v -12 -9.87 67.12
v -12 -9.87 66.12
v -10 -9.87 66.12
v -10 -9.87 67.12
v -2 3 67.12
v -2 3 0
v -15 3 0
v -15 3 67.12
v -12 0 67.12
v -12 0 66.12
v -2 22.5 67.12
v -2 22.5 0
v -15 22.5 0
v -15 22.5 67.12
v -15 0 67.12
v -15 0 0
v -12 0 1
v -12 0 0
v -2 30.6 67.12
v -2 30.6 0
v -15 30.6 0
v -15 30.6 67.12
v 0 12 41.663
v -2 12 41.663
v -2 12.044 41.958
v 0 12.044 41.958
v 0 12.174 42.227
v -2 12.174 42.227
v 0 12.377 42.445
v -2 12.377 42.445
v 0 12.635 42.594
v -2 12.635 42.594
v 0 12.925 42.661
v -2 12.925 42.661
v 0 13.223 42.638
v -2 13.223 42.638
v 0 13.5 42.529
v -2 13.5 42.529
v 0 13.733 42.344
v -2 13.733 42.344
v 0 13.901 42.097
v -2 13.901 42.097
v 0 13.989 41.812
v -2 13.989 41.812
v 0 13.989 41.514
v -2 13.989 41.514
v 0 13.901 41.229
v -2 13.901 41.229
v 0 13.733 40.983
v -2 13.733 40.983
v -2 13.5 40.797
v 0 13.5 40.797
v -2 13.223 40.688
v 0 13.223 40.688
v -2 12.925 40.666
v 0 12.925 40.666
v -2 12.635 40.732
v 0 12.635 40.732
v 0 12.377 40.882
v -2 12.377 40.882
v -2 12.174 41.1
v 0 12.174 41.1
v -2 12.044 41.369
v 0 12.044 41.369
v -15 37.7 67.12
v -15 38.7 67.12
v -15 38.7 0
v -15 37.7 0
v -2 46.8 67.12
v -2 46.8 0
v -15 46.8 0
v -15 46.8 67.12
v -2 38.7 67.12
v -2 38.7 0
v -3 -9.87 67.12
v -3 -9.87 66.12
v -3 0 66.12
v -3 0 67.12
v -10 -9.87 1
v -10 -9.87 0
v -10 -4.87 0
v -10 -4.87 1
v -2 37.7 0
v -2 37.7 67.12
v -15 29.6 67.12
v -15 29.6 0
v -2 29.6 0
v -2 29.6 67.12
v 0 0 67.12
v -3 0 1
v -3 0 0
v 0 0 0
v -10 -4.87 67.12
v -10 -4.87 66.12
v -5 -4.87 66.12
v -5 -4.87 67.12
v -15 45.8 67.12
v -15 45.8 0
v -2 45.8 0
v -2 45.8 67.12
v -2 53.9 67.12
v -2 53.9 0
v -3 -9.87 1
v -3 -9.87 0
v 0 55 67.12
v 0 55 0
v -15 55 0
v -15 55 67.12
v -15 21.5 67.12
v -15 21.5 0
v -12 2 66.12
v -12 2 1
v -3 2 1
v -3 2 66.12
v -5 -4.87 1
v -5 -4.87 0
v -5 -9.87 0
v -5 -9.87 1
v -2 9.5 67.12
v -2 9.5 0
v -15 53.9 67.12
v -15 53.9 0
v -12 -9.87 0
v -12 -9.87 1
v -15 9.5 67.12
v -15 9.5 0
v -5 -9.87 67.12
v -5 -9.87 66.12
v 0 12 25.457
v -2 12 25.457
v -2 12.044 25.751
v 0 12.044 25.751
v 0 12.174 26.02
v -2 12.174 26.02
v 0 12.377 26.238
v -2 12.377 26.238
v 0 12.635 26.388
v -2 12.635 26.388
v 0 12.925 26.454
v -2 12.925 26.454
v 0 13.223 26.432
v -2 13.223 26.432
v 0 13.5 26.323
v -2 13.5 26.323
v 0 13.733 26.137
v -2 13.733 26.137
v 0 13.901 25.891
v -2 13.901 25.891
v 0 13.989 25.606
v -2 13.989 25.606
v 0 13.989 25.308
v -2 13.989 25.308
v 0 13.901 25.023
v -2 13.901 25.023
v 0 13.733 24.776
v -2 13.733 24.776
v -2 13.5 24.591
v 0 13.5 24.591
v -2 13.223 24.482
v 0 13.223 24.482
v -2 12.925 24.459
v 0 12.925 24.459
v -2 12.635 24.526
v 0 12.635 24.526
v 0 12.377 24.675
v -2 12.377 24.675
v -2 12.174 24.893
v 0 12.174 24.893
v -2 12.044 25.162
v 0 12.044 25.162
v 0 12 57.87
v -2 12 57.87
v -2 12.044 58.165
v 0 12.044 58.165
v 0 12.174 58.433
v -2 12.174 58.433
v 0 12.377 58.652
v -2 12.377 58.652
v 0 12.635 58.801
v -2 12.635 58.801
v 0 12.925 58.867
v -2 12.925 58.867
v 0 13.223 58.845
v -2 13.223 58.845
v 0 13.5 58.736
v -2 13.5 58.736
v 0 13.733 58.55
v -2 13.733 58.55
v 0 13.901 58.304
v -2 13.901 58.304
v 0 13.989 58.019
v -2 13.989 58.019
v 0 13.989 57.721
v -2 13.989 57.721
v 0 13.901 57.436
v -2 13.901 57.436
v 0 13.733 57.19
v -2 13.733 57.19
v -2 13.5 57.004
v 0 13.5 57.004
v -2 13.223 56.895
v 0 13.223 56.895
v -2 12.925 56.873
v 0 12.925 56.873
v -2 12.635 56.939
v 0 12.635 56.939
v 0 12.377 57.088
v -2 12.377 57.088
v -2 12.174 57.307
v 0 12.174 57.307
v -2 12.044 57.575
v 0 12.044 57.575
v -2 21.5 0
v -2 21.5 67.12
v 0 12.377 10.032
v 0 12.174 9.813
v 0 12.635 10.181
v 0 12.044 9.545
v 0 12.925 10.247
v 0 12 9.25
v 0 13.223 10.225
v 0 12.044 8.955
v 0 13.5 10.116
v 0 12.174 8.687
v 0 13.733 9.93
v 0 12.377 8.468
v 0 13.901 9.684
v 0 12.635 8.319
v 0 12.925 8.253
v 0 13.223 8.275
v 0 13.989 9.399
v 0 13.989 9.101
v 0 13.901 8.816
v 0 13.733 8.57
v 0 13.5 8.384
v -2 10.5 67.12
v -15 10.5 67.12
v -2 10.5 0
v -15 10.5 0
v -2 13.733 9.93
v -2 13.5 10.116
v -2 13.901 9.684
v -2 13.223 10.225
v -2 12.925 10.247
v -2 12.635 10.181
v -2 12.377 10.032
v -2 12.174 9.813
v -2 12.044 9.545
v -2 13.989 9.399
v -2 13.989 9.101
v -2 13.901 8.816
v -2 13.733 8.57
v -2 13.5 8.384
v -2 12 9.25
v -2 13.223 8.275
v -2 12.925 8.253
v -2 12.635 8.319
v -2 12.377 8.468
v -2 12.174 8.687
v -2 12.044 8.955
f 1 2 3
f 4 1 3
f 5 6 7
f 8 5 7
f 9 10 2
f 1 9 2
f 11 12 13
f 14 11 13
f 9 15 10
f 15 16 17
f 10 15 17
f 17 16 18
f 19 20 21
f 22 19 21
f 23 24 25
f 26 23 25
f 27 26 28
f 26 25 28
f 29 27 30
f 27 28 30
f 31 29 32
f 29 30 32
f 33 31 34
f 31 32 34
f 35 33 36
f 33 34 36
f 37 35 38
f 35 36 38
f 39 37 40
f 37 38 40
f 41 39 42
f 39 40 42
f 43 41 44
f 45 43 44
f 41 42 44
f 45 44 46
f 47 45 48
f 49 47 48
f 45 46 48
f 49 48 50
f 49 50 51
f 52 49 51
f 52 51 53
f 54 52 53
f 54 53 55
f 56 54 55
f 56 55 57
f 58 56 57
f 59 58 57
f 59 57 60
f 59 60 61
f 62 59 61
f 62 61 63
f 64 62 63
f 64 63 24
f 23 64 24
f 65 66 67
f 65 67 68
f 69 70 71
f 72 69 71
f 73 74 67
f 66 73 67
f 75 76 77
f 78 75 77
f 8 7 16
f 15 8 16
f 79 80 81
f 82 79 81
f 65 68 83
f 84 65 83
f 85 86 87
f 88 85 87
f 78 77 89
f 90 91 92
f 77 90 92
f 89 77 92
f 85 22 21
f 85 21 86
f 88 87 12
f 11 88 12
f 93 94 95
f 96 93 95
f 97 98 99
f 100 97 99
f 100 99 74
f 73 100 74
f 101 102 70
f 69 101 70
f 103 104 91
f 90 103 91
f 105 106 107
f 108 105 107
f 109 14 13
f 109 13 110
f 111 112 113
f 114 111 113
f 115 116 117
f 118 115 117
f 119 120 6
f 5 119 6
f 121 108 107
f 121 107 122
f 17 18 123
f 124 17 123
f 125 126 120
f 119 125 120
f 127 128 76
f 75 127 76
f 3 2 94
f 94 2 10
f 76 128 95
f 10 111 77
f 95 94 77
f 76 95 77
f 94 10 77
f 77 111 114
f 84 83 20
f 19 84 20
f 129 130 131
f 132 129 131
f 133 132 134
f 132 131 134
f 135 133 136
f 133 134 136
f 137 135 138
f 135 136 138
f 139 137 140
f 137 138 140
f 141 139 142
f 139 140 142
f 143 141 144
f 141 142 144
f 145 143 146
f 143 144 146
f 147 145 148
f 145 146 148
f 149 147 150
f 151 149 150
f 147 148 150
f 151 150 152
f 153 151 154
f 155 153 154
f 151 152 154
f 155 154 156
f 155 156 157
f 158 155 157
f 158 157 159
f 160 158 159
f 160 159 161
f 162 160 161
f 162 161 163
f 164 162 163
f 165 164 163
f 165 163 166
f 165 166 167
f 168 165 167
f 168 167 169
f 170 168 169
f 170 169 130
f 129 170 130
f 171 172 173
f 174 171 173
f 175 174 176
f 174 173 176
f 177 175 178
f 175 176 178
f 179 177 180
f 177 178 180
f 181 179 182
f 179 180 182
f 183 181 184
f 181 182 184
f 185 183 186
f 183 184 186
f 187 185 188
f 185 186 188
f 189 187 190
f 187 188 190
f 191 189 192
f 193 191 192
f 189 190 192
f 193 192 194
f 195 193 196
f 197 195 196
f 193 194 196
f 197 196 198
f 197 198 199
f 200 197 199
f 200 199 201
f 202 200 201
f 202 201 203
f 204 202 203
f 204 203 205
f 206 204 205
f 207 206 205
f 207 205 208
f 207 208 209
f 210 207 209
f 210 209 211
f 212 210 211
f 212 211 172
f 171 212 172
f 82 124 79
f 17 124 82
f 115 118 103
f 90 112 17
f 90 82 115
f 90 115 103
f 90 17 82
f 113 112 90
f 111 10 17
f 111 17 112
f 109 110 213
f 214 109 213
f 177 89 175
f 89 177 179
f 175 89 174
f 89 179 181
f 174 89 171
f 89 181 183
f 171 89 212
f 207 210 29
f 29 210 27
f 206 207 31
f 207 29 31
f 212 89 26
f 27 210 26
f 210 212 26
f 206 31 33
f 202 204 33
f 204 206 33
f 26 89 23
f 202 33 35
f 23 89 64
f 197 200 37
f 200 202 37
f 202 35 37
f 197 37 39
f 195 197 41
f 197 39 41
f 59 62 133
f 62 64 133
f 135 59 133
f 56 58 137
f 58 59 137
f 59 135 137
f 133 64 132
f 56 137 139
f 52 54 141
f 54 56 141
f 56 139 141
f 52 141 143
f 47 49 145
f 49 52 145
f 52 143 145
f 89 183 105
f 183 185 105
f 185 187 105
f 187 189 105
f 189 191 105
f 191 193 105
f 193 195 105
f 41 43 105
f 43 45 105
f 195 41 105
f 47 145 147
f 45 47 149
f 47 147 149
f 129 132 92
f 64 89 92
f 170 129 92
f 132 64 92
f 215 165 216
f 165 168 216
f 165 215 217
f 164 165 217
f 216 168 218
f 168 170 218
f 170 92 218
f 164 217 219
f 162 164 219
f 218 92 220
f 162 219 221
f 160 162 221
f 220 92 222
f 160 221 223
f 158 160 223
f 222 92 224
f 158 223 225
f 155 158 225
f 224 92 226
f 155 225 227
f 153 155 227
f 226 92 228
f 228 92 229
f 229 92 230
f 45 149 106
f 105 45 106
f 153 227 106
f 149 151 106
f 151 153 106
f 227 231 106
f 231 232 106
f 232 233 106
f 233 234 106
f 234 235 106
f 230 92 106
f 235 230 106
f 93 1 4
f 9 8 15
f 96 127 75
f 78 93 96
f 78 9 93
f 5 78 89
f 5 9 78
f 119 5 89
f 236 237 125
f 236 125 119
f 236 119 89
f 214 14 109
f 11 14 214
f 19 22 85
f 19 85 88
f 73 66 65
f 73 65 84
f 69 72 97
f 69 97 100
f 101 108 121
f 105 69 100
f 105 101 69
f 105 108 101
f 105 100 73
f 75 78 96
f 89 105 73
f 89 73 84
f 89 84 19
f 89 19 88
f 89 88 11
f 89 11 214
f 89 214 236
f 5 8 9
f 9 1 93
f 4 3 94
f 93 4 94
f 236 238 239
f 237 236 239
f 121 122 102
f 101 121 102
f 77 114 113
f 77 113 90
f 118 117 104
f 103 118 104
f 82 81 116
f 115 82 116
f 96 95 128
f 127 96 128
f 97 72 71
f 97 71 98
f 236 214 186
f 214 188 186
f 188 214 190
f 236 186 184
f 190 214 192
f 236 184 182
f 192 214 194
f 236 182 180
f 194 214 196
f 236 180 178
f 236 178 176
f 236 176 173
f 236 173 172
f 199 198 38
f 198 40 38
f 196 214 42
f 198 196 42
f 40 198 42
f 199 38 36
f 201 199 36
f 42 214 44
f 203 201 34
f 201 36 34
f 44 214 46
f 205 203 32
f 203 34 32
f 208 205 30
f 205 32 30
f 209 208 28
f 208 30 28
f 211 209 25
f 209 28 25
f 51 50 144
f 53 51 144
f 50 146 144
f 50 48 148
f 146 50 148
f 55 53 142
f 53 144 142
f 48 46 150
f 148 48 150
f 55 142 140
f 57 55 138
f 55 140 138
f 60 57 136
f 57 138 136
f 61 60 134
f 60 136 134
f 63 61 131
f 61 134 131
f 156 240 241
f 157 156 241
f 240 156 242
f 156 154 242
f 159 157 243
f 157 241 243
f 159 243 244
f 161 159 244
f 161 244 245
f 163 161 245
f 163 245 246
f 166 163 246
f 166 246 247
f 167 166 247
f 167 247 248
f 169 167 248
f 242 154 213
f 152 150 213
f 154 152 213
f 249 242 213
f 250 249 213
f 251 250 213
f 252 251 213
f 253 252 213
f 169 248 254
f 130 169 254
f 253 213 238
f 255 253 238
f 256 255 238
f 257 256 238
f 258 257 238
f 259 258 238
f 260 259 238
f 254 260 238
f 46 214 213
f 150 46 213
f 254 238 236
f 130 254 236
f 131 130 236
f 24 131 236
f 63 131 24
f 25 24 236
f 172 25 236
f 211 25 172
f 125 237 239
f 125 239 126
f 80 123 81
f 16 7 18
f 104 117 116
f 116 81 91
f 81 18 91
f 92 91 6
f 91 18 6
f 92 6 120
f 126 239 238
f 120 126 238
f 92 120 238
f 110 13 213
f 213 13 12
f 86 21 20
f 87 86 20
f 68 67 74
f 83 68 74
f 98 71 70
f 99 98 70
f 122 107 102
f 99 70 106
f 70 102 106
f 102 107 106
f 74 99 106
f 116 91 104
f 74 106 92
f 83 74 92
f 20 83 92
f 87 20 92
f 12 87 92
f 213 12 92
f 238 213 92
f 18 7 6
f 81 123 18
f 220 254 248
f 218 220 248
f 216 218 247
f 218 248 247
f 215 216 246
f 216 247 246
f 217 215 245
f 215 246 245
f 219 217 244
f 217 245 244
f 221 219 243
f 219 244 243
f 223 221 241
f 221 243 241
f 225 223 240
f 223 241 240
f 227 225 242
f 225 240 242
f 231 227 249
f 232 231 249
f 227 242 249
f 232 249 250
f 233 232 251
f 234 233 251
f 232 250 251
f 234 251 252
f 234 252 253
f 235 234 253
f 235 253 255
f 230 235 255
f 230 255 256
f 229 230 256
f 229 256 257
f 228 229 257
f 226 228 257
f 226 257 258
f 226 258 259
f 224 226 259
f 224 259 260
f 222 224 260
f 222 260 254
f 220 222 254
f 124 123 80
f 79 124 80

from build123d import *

# Parameters (mm, degrees)
F1_DEPTH = 67.12
F2_DEPTH = 1
F3_START = 66.12
F3_DEPTH = 1
F5_D     = 2


with BuildPart() as f1:
    # F0 (on Top) → F1 (new body)
    with BuildSketch(Plane.XY):
        Polygon((0, 0), (0, 55), (-15, 55), (-15, 54.9), (-15, 53.9), (-2, 53.9), (-2, 46.8), (-15, 46.8), (-15, 45.8), (-2, 45.8), (-2, 38.7), (-15, 38.7), (-15, 37.7), (-2, 37.7), (-2, 30.6), (-15, 30.6), (-15, 29.6), (-2, 29.6), (-2, 22.5), (-15, 22.5), (-15, 21.5), (-2, 21.5), (-2, 10.5), (-15, 10.5), (-15, 9.5), (-2, 9.5), (-2, 3), (-15, 3), (-15, 0), (-12, 0), (-12, 2), (-3, 2), (-3, 0), align=None)
    extrude(amount=F1_DEPTH)

    # F0 (on Top) → F2 (join)
    with BuildSketch(Plane.XY):
        Polygon((-3, -9.87), (-3, 0), (-3, 2), (-12, 2), (-12, 0), (-12, -9.87), (-10, -9.87), (-10, -4.87), (-5, -4.87), (-5, -9.87), align=None)
    extrude(amount=F2_DEPTH)

    # F0 (on Top) → F3 (join)
    with BuildSketch(Plane.XY.offset(F3_START)):
        Polygon((-3, -9.87), (-3, 0), (-3, 2), (-12, 2), (-12, 0), (-12, -9.87), (-10, -9.87), (-10, -4.87), (-5, -4.87), (-5, -9.87), align=None)
    extrude(amount=F3_DEPTH)

    # F5 (through all)
    with Locations(Plane.YZ):
        with Locations((13, 57.87), (13, 41.6633333333), (13, 25.4566666667), (13, 9.25)):
            Hole(F5_D / 2)


solid = f1.part
